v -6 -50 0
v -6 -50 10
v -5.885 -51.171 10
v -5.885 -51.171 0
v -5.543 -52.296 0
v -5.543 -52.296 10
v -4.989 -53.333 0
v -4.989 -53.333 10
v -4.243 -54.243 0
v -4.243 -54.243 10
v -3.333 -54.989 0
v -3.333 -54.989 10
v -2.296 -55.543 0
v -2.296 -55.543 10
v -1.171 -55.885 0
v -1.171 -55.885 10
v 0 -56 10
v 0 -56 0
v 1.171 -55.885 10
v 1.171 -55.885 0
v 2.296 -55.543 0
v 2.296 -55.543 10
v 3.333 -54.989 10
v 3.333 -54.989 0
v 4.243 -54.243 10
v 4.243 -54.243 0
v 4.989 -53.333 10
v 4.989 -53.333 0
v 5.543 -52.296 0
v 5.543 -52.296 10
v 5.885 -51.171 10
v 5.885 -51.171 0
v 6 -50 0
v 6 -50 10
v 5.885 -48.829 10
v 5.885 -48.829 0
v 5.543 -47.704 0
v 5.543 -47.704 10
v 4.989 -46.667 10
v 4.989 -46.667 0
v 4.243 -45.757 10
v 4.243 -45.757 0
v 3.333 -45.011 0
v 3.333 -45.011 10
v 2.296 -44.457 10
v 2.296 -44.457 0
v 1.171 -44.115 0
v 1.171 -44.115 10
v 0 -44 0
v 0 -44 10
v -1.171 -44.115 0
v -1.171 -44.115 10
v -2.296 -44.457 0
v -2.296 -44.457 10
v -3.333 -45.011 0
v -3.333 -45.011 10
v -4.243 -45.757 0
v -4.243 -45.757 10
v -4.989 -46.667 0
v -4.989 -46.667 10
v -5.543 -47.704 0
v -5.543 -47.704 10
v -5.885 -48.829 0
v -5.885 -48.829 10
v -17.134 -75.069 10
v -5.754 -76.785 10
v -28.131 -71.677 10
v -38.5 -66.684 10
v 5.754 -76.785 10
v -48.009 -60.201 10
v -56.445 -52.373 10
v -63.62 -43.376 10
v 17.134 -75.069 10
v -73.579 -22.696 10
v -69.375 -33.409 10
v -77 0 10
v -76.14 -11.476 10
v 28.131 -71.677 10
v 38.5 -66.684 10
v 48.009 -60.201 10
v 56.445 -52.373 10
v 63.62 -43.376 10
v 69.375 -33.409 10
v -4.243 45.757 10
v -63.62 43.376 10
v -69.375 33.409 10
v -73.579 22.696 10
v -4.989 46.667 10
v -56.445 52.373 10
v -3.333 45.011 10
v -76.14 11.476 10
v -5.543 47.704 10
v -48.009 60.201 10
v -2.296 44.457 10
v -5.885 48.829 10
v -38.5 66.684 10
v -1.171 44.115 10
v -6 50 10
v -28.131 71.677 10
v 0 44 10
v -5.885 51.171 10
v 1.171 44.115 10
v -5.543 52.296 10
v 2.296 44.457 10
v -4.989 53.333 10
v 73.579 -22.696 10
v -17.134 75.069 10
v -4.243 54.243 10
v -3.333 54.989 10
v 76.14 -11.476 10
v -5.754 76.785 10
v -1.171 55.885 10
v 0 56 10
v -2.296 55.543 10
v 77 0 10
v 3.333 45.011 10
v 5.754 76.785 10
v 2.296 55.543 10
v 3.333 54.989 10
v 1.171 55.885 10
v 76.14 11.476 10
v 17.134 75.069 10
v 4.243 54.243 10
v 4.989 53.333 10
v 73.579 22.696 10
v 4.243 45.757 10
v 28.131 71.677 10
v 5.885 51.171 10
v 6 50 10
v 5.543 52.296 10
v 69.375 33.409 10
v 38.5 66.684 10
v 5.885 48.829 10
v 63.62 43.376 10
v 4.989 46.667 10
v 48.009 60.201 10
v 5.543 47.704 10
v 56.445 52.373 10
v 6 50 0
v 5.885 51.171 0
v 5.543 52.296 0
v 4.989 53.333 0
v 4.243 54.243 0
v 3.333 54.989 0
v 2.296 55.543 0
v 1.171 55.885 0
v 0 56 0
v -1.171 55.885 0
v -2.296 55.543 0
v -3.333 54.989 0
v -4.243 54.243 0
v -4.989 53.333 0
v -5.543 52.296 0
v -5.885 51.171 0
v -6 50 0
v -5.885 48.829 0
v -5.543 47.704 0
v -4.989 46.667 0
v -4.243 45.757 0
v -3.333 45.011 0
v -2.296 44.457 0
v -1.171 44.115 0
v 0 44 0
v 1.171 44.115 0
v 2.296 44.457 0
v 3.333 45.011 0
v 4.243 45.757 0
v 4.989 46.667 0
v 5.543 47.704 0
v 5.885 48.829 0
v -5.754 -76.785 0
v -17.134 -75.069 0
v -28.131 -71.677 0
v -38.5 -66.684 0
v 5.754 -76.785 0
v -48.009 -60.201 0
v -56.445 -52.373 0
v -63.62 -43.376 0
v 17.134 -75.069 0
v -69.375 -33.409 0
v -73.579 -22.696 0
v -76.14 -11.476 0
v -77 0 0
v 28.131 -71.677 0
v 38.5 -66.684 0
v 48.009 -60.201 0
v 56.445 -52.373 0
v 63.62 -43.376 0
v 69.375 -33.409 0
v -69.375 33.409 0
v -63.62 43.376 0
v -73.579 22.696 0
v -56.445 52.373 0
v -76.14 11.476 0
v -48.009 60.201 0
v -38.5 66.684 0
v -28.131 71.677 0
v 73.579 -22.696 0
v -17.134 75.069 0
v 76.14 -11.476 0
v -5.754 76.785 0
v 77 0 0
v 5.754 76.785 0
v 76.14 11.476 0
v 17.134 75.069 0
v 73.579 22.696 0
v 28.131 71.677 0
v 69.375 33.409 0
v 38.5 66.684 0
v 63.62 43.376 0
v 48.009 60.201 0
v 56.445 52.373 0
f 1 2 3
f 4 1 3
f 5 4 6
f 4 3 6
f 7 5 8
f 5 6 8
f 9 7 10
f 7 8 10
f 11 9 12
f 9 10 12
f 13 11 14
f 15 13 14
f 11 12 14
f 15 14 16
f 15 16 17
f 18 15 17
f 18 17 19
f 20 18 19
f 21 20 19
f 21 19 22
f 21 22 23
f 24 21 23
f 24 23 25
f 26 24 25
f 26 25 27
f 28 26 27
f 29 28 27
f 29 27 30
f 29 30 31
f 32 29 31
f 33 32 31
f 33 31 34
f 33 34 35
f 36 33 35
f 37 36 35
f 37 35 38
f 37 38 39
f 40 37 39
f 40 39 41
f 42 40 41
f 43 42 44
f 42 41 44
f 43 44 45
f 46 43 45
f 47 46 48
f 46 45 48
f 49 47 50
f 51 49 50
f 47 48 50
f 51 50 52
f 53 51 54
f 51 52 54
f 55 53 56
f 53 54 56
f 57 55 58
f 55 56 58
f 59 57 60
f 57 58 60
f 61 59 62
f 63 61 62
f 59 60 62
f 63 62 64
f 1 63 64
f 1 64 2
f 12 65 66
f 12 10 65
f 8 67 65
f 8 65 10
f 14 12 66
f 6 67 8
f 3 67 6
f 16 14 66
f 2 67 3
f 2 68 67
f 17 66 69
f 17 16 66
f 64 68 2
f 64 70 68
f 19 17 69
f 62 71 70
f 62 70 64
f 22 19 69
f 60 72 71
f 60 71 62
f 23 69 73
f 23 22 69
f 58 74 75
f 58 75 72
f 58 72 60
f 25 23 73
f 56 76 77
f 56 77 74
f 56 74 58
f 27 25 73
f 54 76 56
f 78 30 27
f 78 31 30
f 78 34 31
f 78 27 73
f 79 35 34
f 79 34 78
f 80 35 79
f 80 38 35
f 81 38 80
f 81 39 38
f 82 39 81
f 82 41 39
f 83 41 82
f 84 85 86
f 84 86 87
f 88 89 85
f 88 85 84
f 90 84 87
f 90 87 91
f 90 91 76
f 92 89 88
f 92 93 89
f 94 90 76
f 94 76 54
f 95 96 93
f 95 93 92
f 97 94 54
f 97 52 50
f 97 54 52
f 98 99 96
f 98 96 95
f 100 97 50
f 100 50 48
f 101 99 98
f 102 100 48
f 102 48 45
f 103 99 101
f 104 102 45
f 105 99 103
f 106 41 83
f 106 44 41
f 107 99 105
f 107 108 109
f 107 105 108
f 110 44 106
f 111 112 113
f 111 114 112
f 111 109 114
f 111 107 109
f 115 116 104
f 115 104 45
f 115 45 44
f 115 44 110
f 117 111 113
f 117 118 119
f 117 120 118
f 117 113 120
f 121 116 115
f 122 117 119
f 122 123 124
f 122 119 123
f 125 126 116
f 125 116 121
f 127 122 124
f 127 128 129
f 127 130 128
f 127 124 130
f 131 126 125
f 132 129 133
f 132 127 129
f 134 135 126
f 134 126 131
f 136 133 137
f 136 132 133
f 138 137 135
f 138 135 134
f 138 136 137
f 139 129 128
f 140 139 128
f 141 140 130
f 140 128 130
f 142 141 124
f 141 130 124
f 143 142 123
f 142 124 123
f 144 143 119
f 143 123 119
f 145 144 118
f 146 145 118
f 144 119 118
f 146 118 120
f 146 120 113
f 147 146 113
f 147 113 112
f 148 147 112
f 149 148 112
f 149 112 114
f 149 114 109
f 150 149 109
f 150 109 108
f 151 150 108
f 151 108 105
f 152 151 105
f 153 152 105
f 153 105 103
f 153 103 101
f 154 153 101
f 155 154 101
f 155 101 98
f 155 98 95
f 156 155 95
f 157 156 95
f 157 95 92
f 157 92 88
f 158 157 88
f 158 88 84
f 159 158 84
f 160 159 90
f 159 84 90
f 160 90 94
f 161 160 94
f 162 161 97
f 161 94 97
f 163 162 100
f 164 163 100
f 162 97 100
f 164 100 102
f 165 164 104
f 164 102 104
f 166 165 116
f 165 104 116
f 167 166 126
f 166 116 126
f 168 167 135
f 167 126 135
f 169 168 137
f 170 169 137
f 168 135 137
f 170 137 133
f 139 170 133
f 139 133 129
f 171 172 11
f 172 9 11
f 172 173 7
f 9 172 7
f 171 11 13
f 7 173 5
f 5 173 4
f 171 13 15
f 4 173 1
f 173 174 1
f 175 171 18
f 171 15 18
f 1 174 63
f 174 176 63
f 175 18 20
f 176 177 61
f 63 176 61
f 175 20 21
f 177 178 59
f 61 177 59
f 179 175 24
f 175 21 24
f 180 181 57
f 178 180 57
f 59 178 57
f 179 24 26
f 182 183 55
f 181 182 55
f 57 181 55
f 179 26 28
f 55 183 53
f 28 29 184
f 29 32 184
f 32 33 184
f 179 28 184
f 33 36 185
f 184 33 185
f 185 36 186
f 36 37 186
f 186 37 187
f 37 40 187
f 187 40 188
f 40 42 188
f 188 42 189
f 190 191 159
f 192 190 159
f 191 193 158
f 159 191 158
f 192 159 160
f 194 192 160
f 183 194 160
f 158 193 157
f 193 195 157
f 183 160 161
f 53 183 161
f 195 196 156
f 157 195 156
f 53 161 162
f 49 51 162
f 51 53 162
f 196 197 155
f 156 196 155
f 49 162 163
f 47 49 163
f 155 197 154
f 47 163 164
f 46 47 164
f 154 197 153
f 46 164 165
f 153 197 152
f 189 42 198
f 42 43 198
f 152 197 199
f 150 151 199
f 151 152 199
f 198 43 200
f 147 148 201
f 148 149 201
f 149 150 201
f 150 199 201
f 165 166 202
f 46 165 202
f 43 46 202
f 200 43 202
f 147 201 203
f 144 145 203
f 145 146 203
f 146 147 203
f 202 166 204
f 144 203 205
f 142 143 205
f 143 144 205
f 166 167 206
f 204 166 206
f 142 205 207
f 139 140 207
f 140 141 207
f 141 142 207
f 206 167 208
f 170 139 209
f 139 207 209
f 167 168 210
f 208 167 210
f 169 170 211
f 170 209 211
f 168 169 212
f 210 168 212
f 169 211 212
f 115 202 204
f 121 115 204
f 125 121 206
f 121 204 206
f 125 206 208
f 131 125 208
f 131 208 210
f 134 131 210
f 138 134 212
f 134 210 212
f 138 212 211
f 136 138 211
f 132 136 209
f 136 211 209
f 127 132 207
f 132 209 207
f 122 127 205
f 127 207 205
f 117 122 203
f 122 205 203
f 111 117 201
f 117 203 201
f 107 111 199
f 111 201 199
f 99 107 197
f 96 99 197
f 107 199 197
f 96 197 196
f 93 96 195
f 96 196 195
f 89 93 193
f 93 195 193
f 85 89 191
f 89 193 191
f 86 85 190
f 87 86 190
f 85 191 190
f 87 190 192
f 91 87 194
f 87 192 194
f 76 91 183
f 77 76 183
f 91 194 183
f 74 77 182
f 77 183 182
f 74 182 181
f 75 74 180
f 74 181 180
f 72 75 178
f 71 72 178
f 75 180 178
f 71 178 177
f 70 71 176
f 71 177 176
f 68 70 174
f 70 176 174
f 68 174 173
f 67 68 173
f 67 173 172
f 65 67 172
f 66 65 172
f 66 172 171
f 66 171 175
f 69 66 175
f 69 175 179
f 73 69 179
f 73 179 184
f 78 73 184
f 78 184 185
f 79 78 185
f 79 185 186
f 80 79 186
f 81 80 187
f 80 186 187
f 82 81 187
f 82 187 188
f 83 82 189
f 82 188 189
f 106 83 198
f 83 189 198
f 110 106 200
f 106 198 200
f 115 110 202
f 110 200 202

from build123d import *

# Parameters (mm, degrees)
SKETCH_R           = 77
PAD_DEPTH          = 10
SKETCH001_R        = 6
POCKET_DEPTH       = 446.037696
POLARPATTERN_COUNT = 2


with BuildPart() as part:
    # Sketch → Pad (new body)
    with BuildSketch(Plane.XY):
        Circle(SKETCH_R)
    extrude(amount=PAD_DEPTH)

    # Sketch001 (on Face3 of Pad) → Pocket (cut, through all)
    with BuildSketch(Plane.XY.offset(10)):
        with Locations((0, 50)):
            Circle(SKETCH001_R)
    pocket = extrude(amount=-POCKET_DEPTH, mode=Mode.SUBTRACT)

    # PolarPattern: Pocket ×2 about axis
    polarpattern_axis = Axis((0, 0, 10), (0, 0, 1))
    for i in range(1, POLARPATTERN_COUNT):
        add(pocket.rotate(polarpattern_axis, i * 360 / POLARPATTERN_COUNT), mode=Mode.SUBTRACT)


solid = part.part
